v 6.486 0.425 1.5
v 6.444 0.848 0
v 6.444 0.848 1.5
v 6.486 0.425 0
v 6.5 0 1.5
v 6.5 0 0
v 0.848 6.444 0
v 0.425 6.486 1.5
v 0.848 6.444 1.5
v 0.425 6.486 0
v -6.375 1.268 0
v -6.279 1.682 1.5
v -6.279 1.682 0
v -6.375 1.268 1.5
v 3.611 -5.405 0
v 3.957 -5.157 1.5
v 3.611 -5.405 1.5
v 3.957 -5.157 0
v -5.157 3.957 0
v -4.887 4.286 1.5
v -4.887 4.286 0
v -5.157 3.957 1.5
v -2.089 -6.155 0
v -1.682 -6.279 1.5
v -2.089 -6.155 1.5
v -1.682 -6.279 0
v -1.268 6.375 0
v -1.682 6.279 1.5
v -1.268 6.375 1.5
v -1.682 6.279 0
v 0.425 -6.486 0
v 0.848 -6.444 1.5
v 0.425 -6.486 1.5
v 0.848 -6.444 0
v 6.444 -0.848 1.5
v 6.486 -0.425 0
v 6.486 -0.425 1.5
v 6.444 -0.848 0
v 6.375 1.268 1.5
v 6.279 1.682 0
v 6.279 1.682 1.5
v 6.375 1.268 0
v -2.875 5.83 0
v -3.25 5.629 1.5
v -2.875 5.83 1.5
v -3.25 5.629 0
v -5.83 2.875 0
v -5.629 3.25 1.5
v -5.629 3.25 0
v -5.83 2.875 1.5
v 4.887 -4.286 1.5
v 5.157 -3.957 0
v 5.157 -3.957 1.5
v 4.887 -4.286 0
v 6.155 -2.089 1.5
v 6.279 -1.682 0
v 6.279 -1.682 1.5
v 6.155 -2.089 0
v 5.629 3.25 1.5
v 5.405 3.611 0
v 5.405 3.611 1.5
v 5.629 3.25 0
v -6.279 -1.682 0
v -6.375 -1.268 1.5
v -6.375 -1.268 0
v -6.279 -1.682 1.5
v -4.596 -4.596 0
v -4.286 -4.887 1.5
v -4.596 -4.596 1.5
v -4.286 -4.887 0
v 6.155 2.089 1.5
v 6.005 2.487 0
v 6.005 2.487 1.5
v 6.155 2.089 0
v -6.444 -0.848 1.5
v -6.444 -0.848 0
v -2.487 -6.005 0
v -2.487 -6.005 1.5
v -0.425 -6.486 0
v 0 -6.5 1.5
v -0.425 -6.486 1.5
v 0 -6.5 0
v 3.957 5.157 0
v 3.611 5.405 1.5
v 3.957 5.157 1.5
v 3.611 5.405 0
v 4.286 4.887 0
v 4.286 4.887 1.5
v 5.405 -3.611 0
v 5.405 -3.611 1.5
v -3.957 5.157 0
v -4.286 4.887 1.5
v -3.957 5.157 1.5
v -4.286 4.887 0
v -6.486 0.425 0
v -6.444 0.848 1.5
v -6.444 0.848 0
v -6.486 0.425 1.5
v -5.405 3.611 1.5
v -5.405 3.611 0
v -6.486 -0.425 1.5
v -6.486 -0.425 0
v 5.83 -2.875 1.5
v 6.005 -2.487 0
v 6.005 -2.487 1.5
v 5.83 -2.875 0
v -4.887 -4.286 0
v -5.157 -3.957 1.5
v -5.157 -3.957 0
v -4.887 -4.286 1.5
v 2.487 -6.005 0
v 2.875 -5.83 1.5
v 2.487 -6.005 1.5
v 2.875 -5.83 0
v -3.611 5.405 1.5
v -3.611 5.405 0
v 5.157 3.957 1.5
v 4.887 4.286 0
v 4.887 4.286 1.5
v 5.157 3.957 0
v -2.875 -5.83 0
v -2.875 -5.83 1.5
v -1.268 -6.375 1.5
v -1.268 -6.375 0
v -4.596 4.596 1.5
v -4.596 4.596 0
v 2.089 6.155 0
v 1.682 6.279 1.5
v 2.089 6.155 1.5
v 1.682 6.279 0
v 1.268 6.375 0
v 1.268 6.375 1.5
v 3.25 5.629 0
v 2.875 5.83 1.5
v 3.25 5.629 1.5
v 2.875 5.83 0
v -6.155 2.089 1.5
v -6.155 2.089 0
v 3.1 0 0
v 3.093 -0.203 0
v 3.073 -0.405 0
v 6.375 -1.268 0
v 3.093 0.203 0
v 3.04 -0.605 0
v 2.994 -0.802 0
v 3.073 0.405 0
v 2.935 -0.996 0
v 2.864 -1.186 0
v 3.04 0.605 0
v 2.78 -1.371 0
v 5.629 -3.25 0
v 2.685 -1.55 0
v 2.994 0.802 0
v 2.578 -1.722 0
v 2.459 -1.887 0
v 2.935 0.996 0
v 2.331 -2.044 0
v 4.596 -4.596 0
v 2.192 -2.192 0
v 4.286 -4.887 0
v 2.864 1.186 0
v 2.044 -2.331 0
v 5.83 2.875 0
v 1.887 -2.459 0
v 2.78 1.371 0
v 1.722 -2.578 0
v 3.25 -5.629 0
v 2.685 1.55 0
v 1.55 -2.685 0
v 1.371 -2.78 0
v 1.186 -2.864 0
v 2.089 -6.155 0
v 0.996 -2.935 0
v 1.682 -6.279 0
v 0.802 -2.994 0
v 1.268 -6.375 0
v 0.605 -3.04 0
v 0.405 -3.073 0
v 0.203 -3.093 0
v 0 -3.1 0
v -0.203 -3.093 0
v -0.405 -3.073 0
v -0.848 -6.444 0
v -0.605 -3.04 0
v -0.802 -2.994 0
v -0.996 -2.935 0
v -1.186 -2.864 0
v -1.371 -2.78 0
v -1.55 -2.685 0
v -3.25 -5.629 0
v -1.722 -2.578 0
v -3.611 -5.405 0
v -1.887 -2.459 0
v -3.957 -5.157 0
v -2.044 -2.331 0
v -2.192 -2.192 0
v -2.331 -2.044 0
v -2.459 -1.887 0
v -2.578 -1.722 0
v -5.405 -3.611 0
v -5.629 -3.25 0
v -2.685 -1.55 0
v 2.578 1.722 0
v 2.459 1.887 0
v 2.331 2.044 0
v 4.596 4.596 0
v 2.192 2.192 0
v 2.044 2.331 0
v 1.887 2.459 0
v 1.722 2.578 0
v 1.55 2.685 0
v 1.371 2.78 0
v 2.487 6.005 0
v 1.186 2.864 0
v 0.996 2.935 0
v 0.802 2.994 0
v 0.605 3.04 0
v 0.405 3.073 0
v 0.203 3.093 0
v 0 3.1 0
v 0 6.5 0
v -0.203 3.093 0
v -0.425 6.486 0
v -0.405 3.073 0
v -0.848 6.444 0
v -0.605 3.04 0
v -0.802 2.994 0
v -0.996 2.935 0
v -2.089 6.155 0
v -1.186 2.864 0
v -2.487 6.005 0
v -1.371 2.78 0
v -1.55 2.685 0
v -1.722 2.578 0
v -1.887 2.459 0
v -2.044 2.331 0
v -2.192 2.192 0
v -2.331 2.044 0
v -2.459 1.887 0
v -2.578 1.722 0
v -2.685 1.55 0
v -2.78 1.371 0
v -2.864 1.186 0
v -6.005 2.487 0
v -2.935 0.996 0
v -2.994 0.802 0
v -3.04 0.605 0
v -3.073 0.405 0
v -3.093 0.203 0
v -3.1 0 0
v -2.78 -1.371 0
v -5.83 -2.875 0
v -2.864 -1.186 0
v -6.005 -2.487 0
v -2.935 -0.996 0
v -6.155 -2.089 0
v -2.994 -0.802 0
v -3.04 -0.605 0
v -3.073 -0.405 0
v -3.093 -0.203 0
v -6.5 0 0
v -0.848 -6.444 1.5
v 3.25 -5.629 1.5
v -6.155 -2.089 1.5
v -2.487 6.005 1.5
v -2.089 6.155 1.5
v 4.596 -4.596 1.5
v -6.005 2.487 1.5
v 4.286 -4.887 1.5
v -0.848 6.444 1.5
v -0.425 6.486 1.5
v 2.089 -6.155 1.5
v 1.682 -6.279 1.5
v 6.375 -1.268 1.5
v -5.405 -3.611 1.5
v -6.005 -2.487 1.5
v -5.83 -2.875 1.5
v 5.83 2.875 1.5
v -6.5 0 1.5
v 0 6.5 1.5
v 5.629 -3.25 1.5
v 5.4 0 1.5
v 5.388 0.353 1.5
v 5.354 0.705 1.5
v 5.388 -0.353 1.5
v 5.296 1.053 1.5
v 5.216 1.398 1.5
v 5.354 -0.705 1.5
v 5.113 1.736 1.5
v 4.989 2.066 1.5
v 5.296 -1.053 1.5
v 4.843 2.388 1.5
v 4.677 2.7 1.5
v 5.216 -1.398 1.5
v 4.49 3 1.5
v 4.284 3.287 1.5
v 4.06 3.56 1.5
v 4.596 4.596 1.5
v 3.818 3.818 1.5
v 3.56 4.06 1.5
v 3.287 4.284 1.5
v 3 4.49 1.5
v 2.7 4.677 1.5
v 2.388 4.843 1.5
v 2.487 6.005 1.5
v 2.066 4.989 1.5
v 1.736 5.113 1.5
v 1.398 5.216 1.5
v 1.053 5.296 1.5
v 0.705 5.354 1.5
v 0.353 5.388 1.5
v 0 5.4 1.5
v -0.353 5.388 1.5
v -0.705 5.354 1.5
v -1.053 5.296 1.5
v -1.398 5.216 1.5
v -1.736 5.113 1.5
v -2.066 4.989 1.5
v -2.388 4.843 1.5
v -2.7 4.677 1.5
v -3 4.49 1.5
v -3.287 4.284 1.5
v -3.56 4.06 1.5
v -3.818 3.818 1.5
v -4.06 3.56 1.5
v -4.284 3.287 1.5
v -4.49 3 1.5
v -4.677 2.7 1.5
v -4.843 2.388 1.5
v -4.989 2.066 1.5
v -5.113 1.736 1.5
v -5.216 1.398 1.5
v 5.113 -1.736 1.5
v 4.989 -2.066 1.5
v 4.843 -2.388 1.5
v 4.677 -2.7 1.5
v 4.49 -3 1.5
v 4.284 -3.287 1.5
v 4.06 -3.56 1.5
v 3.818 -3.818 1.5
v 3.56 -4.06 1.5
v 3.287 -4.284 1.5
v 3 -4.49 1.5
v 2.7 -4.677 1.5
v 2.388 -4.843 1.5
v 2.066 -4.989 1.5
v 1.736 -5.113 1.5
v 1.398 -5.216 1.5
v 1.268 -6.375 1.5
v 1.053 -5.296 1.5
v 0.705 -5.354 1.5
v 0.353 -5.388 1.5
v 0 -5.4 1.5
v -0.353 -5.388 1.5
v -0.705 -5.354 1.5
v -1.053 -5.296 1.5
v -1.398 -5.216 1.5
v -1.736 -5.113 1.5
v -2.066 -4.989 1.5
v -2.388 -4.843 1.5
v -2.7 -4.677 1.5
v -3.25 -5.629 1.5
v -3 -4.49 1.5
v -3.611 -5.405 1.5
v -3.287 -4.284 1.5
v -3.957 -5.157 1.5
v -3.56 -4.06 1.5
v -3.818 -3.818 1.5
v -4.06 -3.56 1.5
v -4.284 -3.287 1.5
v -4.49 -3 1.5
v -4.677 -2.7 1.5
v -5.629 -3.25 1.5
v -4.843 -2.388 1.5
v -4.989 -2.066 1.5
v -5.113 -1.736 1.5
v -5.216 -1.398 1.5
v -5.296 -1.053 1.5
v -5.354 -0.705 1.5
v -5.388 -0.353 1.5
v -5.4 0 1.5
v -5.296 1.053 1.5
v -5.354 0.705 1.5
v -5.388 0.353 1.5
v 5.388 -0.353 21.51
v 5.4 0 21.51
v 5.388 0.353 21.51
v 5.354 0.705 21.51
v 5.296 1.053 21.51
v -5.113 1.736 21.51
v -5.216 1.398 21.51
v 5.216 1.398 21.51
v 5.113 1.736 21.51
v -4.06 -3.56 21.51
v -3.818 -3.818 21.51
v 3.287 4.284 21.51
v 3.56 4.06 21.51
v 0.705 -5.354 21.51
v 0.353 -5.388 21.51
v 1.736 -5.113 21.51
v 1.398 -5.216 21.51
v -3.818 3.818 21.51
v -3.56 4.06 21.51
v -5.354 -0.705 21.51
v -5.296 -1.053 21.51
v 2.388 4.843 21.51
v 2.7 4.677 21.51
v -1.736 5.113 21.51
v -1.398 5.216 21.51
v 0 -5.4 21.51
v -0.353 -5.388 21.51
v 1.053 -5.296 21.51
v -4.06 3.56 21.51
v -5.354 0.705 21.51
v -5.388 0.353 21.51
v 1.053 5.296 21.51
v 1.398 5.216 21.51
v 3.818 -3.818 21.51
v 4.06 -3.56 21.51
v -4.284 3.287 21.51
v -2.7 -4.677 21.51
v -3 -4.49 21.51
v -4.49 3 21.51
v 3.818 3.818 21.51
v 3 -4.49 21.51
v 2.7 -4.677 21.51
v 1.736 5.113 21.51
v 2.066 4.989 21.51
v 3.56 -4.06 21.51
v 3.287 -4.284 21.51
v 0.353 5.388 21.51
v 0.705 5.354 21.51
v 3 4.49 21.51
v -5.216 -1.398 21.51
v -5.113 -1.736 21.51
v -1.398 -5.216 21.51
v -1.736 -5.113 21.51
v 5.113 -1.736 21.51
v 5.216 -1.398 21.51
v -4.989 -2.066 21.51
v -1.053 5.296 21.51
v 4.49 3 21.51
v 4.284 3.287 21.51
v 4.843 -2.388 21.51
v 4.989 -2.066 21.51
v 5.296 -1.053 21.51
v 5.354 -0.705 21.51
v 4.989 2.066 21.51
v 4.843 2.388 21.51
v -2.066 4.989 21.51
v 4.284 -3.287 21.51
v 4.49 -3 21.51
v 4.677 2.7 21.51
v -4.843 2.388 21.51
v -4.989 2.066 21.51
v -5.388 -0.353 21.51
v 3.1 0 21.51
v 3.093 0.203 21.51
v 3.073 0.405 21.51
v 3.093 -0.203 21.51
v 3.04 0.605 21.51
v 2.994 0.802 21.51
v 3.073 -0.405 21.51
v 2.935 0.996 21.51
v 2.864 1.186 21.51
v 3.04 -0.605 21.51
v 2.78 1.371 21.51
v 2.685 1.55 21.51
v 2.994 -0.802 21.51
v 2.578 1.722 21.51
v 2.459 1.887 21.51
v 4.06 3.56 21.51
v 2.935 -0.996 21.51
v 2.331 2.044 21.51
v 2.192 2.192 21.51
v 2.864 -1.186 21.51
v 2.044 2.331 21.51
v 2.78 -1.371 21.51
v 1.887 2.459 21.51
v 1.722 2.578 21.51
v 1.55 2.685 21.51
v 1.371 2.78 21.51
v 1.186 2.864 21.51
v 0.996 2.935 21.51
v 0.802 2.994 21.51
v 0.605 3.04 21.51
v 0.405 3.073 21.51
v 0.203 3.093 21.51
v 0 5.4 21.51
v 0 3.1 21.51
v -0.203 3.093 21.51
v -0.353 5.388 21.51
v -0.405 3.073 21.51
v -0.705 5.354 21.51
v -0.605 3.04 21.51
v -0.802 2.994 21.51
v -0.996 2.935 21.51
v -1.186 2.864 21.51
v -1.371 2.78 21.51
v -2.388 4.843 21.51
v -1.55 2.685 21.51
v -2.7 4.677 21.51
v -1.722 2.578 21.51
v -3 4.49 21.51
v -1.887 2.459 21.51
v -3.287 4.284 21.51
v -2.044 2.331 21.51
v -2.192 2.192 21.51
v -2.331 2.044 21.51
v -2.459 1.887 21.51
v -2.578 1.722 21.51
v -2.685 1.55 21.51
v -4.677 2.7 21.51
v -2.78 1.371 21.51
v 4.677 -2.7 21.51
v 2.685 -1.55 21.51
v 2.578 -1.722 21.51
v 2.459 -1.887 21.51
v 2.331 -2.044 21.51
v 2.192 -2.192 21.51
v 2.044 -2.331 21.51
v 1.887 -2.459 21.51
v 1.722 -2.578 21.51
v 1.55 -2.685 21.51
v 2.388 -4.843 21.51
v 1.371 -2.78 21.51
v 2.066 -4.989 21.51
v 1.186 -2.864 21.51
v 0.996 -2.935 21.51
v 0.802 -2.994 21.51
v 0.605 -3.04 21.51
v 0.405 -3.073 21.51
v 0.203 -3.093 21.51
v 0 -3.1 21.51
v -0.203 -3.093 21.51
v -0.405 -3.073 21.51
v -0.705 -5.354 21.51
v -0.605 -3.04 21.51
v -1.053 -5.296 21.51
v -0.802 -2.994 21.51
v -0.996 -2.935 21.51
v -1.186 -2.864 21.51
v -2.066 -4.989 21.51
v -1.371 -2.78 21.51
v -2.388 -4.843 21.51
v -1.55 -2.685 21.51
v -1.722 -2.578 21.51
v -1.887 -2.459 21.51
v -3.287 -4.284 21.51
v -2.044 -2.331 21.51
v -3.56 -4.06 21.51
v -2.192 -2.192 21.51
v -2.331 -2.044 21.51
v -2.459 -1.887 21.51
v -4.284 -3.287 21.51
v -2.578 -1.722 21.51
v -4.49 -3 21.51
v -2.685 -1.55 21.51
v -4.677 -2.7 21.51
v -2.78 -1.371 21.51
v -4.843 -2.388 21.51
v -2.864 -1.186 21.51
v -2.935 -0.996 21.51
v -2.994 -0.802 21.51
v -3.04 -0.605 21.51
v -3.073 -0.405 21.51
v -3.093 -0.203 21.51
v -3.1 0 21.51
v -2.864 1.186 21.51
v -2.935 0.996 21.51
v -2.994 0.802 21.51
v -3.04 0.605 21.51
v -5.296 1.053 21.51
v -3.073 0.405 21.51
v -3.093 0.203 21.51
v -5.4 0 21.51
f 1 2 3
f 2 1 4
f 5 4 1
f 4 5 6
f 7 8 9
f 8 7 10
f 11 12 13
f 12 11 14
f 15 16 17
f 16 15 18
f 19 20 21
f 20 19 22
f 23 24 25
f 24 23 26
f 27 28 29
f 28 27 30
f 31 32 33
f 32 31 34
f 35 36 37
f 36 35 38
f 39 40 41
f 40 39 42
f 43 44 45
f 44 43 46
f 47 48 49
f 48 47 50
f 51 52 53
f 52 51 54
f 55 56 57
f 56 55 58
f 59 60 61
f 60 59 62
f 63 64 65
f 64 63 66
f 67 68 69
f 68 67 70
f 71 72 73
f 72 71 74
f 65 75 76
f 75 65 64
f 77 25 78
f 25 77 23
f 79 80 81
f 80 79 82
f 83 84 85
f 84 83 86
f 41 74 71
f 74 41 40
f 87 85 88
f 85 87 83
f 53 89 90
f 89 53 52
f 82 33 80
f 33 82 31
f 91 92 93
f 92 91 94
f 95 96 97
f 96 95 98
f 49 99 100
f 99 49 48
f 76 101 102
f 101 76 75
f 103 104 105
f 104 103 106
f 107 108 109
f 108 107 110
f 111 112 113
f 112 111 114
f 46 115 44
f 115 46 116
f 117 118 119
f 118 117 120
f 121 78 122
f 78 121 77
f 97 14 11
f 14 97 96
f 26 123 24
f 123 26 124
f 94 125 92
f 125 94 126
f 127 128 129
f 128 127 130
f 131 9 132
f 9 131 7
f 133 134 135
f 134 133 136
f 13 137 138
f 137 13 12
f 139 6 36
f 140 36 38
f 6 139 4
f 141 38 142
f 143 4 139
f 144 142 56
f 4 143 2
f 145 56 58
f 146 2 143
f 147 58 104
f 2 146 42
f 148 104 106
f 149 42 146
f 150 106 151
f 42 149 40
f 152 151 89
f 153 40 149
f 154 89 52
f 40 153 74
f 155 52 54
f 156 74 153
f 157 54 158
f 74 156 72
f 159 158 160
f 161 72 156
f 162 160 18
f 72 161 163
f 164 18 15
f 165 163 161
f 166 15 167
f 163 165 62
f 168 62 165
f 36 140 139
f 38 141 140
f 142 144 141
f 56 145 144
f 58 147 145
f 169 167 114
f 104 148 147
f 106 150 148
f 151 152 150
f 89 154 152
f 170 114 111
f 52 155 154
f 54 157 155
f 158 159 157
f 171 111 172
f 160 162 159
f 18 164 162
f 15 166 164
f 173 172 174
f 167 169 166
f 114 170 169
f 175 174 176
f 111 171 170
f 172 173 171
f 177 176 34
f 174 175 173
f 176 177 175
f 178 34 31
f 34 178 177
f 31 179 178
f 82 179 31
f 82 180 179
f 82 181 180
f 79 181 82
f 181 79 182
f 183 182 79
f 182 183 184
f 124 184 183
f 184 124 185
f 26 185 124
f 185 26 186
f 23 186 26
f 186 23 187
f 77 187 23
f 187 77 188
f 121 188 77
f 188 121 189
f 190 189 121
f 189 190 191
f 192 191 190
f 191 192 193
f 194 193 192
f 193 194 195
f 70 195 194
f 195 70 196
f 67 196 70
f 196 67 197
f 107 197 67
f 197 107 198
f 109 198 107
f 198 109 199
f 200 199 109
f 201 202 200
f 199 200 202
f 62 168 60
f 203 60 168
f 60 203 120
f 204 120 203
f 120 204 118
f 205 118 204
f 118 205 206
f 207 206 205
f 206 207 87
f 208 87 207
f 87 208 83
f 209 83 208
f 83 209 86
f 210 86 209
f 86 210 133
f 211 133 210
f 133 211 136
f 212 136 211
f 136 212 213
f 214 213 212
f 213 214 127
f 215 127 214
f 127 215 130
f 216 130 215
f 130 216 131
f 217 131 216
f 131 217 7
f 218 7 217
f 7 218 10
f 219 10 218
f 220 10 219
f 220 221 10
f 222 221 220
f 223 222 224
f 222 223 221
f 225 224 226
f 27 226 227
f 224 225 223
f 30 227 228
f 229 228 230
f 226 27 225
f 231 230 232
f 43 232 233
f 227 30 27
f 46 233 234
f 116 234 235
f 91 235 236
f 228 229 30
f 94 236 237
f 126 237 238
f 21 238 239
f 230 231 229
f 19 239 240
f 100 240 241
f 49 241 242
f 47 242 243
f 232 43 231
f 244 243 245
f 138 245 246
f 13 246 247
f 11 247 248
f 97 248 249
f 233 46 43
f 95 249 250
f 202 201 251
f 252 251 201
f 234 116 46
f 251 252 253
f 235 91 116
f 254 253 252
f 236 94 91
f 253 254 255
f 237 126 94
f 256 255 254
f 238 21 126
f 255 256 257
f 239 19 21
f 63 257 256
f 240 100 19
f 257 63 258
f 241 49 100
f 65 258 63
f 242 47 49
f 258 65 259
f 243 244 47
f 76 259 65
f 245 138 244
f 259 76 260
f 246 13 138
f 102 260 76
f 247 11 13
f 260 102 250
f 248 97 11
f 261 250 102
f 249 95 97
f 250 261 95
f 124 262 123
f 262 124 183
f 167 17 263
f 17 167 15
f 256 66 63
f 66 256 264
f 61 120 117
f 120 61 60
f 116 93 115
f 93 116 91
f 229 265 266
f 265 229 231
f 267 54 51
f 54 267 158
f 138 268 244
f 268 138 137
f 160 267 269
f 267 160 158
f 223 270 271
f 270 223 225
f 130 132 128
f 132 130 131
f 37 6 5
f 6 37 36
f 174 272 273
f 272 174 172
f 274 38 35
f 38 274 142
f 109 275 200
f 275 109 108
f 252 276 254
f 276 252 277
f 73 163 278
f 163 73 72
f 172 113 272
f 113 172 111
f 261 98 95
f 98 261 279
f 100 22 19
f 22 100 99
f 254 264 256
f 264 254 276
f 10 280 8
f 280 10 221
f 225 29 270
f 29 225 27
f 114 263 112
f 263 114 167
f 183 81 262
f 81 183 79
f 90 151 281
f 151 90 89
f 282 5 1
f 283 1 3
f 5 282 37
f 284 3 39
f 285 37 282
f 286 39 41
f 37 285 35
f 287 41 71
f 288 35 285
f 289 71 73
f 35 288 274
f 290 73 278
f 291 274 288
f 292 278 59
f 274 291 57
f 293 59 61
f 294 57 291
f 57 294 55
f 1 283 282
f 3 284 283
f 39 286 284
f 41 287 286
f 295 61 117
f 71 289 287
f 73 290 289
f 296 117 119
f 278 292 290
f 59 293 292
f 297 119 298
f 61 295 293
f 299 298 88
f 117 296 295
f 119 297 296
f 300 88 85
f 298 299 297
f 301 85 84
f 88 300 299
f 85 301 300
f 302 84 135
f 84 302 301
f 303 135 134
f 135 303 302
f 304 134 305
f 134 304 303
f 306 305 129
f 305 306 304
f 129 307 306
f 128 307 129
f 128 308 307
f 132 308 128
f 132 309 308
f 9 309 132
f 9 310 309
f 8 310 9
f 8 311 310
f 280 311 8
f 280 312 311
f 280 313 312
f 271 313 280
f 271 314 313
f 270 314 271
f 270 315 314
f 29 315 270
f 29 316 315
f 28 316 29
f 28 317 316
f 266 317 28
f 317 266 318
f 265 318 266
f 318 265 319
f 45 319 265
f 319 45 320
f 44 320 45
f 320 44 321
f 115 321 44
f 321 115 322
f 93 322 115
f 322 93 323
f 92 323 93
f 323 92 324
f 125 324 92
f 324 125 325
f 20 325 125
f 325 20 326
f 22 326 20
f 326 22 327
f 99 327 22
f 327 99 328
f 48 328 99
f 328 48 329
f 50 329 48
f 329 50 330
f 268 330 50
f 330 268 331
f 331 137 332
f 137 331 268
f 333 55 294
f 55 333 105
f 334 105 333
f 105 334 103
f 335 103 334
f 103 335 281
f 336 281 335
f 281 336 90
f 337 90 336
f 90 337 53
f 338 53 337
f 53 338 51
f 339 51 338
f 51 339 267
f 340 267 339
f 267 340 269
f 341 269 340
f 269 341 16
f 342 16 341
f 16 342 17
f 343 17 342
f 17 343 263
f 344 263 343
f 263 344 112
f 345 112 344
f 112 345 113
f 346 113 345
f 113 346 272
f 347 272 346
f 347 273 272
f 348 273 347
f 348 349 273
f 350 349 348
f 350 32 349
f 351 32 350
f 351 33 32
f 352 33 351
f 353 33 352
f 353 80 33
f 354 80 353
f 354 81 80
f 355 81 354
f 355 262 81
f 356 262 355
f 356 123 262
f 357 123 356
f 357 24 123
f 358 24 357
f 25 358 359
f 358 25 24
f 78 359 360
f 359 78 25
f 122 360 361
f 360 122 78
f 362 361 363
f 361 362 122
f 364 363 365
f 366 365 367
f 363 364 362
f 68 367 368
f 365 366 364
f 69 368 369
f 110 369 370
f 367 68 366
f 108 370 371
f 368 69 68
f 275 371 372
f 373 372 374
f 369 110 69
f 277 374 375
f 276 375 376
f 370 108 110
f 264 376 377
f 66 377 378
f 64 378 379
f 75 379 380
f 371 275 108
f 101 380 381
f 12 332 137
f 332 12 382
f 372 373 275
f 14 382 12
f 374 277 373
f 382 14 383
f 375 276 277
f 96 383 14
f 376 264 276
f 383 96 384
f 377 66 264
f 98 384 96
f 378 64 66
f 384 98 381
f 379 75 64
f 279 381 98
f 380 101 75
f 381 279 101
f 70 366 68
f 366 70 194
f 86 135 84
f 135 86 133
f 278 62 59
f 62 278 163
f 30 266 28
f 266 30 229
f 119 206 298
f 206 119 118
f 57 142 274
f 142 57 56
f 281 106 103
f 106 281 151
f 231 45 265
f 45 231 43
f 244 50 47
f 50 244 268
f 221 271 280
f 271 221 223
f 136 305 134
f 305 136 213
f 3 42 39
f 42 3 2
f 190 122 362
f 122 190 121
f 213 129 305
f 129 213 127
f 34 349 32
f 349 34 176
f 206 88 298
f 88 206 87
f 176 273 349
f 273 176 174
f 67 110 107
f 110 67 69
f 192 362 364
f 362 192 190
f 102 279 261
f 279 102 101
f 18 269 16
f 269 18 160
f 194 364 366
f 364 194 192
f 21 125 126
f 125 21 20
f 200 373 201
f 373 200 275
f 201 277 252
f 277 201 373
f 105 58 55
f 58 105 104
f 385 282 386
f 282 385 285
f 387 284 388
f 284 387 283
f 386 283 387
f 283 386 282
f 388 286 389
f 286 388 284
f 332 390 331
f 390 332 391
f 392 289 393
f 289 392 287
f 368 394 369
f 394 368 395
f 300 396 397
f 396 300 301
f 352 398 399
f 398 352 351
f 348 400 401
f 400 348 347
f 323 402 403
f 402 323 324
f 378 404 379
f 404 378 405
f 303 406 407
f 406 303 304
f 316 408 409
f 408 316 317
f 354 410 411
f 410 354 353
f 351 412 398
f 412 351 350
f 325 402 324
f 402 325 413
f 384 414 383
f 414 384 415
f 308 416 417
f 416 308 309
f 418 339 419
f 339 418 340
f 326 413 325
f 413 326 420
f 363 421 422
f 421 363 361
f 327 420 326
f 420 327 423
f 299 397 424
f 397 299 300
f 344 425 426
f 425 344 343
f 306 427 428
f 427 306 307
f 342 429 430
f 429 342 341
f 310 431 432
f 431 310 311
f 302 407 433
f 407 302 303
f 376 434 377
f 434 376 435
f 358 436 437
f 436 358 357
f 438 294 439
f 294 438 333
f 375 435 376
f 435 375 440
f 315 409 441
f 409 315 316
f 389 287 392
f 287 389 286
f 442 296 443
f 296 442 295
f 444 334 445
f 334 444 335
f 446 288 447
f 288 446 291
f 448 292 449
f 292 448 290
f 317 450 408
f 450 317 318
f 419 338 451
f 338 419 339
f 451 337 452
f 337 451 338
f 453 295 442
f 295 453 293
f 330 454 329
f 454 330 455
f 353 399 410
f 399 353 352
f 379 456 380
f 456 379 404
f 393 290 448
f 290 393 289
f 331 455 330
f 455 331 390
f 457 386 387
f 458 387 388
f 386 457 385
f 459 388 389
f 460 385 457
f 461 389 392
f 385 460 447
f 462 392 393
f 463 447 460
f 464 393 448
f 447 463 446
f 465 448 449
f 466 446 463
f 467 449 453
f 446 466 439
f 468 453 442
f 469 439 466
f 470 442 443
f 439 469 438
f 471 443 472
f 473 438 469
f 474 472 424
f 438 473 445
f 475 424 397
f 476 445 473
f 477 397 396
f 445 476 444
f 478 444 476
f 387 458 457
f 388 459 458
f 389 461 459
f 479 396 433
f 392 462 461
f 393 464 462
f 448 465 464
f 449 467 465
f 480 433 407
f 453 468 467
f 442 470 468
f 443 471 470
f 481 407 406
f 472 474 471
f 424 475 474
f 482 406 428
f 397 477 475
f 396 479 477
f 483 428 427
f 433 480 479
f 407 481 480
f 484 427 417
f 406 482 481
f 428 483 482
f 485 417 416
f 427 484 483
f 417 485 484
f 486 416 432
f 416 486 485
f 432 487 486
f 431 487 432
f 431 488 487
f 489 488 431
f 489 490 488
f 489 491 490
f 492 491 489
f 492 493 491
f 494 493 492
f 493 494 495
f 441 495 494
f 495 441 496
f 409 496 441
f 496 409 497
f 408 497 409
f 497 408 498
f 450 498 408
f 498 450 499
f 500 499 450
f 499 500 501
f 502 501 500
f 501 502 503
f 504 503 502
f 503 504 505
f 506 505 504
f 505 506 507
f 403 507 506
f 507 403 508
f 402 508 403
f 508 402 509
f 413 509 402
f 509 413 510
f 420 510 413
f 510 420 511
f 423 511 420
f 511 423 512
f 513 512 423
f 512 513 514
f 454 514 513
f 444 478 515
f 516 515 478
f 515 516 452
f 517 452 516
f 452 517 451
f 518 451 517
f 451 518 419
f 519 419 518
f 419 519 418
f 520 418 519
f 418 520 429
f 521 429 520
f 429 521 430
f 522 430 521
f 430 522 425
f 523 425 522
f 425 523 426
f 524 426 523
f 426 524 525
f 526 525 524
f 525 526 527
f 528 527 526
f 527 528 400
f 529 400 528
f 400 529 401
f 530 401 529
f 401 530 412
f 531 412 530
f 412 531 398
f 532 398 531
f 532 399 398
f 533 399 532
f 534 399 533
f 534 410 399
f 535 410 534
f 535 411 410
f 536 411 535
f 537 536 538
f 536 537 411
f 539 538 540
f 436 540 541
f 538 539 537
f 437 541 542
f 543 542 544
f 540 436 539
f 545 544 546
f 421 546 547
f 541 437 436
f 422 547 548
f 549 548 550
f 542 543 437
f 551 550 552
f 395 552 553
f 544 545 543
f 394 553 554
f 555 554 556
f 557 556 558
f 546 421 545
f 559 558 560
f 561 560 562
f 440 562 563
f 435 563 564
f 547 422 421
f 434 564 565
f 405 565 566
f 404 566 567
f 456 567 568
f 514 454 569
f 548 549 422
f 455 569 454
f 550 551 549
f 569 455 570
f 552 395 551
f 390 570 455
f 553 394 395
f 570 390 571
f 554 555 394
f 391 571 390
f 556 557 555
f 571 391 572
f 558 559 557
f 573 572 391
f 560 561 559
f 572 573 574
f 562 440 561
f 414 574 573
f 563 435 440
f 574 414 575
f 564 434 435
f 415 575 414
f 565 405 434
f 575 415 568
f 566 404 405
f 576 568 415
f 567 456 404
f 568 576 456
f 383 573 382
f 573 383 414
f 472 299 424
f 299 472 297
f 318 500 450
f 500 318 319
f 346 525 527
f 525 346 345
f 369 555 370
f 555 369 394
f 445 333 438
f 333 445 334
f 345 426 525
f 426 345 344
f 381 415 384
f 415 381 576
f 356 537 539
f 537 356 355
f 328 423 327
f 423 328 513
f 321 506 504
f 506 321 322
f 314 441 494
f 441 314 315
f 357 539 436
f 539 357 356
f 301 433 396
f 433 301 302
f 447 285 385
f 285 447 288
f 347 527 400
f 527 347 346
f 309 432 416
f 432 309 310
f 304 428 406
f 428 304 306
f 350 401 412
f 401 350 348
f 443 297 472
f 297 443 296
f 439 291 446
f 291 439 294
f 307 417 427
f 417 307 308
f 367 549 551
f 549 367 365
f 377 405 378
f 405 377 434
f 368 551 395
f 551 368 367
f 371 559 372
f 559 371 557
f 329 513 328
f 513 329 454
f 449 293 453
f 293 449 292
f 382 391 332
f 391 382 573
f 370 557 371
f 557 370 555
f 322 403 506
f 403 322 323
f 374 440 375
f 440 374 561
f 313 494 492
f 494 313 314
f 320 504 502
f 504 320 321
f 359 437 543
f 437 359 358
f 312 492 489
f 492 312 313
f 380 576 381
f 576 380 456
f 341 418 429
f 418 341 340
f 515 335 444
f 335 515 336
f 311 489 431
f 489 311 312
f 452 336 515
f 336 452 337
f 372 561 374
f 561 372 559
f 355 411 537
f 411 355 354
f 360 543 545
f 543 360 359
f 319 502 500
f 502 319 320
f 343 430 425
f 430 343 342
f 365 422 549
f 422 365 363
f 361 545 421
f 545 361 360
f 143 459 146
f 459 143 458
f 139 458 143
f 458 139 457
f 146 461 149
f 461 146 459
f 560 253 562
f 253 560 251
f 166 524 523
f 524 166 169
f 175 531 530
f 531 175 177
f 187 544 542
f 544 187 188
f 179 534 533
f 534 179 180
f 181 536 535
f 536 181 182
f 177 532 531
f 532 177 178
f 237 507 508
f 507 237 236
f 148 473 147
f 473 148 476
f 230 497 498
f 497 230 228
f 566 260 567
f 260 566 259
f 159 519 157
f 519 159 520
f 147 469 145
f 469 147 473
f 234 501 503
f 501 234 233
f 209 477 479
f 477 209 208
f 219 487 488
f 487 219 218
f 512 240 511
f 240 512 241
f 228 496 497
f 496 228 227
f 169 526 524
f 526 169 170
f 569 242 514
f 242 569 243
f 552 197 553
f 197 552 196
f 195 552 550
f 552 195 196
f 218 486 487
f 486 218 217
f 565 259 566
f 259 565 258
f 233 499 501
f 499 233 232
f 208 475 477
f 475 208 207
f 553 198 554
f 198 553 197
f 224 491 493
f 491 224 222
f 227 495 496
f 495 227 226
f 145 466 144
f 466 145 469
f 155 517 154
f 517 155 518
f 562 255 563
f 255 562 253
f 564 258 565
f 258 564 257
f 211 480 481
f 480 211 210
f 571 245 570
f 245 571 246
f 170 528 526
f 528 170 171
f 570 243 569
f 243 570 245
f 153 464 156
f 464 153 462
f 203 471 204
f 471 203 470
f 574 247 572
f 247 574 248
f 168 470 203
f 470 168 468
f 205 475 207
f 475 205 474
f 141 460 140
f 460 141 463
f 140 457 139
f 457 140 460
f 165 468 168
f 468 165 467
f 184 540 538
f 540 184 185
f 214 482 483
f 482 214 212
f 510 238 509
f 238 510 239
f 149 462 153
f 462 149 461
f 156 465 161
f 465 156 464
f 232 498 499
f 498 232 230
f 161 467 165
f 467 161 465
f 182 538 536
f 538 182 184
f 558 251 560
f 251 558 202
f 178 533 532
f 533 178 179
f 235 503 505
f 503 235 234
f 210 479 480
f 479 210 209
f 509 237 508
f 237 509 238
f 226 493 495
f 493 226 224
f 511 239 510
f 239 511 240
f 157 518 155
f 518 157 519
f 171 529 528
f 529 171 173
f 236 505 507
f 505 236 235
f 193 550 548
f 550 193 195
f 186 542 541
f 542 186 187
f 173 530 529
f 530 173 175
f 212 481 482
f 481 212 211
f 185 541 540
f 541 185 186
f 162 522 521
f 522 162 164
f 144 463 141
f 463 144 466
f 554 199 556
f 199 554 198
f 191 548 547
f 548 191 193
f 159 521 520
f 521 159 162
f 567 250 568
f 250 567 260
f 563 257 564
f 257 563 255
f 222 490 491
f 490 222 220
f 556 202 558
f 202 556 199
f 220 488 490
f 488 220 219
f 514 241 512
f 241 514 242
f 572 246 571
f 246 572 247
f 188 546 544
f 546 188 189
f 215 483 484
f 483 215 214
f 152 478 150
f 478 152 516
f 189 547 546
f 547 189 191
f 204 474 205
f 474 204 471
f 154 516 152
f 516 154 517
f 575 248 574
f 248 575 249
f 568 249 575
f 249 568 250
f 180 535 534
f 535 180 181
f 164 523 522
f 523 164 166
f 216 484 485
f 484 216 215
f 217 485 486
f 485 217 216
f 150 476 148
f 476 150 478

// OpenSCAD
// Adapter sleeve: 0.2 mL PCR tube for 1.5 mL tube rack hole
// Print orientation: collar on bed (z = 0), sleeve body builds upward

// ---- Dimensions (mm) ----
collar_d        = 13;     // collar outer diameter
collar_t        = 1.5;    // collar thickness (z = 0 to 1.5)
sleeve_d        = 10.8;   // sleeve body outer diameter
sleeve_h        = 20;     // sleeve body height (z = 1.5 to 21.5)
bore_d          = 6.2;    // through-bore diameter
eps             = 0.5;    // cutter overshoot past faces

$fn = 96;

difference() {
    union() {
        // Collar
        cylinder(d = collar_d, h = collar_t);
        // Sleeve body (slightly overlapping the collar for a clean union)
        translate([0, 0, collar_t - 0.01])
            cylinder(d = sleeve_d, h = sleeve_h + 0.02);
    }
    // Through bore
    translate([0, 0, -eps])
        cylinder(d = bore_d, h = collar_t + sleeve_h + 2 * eps);
}
